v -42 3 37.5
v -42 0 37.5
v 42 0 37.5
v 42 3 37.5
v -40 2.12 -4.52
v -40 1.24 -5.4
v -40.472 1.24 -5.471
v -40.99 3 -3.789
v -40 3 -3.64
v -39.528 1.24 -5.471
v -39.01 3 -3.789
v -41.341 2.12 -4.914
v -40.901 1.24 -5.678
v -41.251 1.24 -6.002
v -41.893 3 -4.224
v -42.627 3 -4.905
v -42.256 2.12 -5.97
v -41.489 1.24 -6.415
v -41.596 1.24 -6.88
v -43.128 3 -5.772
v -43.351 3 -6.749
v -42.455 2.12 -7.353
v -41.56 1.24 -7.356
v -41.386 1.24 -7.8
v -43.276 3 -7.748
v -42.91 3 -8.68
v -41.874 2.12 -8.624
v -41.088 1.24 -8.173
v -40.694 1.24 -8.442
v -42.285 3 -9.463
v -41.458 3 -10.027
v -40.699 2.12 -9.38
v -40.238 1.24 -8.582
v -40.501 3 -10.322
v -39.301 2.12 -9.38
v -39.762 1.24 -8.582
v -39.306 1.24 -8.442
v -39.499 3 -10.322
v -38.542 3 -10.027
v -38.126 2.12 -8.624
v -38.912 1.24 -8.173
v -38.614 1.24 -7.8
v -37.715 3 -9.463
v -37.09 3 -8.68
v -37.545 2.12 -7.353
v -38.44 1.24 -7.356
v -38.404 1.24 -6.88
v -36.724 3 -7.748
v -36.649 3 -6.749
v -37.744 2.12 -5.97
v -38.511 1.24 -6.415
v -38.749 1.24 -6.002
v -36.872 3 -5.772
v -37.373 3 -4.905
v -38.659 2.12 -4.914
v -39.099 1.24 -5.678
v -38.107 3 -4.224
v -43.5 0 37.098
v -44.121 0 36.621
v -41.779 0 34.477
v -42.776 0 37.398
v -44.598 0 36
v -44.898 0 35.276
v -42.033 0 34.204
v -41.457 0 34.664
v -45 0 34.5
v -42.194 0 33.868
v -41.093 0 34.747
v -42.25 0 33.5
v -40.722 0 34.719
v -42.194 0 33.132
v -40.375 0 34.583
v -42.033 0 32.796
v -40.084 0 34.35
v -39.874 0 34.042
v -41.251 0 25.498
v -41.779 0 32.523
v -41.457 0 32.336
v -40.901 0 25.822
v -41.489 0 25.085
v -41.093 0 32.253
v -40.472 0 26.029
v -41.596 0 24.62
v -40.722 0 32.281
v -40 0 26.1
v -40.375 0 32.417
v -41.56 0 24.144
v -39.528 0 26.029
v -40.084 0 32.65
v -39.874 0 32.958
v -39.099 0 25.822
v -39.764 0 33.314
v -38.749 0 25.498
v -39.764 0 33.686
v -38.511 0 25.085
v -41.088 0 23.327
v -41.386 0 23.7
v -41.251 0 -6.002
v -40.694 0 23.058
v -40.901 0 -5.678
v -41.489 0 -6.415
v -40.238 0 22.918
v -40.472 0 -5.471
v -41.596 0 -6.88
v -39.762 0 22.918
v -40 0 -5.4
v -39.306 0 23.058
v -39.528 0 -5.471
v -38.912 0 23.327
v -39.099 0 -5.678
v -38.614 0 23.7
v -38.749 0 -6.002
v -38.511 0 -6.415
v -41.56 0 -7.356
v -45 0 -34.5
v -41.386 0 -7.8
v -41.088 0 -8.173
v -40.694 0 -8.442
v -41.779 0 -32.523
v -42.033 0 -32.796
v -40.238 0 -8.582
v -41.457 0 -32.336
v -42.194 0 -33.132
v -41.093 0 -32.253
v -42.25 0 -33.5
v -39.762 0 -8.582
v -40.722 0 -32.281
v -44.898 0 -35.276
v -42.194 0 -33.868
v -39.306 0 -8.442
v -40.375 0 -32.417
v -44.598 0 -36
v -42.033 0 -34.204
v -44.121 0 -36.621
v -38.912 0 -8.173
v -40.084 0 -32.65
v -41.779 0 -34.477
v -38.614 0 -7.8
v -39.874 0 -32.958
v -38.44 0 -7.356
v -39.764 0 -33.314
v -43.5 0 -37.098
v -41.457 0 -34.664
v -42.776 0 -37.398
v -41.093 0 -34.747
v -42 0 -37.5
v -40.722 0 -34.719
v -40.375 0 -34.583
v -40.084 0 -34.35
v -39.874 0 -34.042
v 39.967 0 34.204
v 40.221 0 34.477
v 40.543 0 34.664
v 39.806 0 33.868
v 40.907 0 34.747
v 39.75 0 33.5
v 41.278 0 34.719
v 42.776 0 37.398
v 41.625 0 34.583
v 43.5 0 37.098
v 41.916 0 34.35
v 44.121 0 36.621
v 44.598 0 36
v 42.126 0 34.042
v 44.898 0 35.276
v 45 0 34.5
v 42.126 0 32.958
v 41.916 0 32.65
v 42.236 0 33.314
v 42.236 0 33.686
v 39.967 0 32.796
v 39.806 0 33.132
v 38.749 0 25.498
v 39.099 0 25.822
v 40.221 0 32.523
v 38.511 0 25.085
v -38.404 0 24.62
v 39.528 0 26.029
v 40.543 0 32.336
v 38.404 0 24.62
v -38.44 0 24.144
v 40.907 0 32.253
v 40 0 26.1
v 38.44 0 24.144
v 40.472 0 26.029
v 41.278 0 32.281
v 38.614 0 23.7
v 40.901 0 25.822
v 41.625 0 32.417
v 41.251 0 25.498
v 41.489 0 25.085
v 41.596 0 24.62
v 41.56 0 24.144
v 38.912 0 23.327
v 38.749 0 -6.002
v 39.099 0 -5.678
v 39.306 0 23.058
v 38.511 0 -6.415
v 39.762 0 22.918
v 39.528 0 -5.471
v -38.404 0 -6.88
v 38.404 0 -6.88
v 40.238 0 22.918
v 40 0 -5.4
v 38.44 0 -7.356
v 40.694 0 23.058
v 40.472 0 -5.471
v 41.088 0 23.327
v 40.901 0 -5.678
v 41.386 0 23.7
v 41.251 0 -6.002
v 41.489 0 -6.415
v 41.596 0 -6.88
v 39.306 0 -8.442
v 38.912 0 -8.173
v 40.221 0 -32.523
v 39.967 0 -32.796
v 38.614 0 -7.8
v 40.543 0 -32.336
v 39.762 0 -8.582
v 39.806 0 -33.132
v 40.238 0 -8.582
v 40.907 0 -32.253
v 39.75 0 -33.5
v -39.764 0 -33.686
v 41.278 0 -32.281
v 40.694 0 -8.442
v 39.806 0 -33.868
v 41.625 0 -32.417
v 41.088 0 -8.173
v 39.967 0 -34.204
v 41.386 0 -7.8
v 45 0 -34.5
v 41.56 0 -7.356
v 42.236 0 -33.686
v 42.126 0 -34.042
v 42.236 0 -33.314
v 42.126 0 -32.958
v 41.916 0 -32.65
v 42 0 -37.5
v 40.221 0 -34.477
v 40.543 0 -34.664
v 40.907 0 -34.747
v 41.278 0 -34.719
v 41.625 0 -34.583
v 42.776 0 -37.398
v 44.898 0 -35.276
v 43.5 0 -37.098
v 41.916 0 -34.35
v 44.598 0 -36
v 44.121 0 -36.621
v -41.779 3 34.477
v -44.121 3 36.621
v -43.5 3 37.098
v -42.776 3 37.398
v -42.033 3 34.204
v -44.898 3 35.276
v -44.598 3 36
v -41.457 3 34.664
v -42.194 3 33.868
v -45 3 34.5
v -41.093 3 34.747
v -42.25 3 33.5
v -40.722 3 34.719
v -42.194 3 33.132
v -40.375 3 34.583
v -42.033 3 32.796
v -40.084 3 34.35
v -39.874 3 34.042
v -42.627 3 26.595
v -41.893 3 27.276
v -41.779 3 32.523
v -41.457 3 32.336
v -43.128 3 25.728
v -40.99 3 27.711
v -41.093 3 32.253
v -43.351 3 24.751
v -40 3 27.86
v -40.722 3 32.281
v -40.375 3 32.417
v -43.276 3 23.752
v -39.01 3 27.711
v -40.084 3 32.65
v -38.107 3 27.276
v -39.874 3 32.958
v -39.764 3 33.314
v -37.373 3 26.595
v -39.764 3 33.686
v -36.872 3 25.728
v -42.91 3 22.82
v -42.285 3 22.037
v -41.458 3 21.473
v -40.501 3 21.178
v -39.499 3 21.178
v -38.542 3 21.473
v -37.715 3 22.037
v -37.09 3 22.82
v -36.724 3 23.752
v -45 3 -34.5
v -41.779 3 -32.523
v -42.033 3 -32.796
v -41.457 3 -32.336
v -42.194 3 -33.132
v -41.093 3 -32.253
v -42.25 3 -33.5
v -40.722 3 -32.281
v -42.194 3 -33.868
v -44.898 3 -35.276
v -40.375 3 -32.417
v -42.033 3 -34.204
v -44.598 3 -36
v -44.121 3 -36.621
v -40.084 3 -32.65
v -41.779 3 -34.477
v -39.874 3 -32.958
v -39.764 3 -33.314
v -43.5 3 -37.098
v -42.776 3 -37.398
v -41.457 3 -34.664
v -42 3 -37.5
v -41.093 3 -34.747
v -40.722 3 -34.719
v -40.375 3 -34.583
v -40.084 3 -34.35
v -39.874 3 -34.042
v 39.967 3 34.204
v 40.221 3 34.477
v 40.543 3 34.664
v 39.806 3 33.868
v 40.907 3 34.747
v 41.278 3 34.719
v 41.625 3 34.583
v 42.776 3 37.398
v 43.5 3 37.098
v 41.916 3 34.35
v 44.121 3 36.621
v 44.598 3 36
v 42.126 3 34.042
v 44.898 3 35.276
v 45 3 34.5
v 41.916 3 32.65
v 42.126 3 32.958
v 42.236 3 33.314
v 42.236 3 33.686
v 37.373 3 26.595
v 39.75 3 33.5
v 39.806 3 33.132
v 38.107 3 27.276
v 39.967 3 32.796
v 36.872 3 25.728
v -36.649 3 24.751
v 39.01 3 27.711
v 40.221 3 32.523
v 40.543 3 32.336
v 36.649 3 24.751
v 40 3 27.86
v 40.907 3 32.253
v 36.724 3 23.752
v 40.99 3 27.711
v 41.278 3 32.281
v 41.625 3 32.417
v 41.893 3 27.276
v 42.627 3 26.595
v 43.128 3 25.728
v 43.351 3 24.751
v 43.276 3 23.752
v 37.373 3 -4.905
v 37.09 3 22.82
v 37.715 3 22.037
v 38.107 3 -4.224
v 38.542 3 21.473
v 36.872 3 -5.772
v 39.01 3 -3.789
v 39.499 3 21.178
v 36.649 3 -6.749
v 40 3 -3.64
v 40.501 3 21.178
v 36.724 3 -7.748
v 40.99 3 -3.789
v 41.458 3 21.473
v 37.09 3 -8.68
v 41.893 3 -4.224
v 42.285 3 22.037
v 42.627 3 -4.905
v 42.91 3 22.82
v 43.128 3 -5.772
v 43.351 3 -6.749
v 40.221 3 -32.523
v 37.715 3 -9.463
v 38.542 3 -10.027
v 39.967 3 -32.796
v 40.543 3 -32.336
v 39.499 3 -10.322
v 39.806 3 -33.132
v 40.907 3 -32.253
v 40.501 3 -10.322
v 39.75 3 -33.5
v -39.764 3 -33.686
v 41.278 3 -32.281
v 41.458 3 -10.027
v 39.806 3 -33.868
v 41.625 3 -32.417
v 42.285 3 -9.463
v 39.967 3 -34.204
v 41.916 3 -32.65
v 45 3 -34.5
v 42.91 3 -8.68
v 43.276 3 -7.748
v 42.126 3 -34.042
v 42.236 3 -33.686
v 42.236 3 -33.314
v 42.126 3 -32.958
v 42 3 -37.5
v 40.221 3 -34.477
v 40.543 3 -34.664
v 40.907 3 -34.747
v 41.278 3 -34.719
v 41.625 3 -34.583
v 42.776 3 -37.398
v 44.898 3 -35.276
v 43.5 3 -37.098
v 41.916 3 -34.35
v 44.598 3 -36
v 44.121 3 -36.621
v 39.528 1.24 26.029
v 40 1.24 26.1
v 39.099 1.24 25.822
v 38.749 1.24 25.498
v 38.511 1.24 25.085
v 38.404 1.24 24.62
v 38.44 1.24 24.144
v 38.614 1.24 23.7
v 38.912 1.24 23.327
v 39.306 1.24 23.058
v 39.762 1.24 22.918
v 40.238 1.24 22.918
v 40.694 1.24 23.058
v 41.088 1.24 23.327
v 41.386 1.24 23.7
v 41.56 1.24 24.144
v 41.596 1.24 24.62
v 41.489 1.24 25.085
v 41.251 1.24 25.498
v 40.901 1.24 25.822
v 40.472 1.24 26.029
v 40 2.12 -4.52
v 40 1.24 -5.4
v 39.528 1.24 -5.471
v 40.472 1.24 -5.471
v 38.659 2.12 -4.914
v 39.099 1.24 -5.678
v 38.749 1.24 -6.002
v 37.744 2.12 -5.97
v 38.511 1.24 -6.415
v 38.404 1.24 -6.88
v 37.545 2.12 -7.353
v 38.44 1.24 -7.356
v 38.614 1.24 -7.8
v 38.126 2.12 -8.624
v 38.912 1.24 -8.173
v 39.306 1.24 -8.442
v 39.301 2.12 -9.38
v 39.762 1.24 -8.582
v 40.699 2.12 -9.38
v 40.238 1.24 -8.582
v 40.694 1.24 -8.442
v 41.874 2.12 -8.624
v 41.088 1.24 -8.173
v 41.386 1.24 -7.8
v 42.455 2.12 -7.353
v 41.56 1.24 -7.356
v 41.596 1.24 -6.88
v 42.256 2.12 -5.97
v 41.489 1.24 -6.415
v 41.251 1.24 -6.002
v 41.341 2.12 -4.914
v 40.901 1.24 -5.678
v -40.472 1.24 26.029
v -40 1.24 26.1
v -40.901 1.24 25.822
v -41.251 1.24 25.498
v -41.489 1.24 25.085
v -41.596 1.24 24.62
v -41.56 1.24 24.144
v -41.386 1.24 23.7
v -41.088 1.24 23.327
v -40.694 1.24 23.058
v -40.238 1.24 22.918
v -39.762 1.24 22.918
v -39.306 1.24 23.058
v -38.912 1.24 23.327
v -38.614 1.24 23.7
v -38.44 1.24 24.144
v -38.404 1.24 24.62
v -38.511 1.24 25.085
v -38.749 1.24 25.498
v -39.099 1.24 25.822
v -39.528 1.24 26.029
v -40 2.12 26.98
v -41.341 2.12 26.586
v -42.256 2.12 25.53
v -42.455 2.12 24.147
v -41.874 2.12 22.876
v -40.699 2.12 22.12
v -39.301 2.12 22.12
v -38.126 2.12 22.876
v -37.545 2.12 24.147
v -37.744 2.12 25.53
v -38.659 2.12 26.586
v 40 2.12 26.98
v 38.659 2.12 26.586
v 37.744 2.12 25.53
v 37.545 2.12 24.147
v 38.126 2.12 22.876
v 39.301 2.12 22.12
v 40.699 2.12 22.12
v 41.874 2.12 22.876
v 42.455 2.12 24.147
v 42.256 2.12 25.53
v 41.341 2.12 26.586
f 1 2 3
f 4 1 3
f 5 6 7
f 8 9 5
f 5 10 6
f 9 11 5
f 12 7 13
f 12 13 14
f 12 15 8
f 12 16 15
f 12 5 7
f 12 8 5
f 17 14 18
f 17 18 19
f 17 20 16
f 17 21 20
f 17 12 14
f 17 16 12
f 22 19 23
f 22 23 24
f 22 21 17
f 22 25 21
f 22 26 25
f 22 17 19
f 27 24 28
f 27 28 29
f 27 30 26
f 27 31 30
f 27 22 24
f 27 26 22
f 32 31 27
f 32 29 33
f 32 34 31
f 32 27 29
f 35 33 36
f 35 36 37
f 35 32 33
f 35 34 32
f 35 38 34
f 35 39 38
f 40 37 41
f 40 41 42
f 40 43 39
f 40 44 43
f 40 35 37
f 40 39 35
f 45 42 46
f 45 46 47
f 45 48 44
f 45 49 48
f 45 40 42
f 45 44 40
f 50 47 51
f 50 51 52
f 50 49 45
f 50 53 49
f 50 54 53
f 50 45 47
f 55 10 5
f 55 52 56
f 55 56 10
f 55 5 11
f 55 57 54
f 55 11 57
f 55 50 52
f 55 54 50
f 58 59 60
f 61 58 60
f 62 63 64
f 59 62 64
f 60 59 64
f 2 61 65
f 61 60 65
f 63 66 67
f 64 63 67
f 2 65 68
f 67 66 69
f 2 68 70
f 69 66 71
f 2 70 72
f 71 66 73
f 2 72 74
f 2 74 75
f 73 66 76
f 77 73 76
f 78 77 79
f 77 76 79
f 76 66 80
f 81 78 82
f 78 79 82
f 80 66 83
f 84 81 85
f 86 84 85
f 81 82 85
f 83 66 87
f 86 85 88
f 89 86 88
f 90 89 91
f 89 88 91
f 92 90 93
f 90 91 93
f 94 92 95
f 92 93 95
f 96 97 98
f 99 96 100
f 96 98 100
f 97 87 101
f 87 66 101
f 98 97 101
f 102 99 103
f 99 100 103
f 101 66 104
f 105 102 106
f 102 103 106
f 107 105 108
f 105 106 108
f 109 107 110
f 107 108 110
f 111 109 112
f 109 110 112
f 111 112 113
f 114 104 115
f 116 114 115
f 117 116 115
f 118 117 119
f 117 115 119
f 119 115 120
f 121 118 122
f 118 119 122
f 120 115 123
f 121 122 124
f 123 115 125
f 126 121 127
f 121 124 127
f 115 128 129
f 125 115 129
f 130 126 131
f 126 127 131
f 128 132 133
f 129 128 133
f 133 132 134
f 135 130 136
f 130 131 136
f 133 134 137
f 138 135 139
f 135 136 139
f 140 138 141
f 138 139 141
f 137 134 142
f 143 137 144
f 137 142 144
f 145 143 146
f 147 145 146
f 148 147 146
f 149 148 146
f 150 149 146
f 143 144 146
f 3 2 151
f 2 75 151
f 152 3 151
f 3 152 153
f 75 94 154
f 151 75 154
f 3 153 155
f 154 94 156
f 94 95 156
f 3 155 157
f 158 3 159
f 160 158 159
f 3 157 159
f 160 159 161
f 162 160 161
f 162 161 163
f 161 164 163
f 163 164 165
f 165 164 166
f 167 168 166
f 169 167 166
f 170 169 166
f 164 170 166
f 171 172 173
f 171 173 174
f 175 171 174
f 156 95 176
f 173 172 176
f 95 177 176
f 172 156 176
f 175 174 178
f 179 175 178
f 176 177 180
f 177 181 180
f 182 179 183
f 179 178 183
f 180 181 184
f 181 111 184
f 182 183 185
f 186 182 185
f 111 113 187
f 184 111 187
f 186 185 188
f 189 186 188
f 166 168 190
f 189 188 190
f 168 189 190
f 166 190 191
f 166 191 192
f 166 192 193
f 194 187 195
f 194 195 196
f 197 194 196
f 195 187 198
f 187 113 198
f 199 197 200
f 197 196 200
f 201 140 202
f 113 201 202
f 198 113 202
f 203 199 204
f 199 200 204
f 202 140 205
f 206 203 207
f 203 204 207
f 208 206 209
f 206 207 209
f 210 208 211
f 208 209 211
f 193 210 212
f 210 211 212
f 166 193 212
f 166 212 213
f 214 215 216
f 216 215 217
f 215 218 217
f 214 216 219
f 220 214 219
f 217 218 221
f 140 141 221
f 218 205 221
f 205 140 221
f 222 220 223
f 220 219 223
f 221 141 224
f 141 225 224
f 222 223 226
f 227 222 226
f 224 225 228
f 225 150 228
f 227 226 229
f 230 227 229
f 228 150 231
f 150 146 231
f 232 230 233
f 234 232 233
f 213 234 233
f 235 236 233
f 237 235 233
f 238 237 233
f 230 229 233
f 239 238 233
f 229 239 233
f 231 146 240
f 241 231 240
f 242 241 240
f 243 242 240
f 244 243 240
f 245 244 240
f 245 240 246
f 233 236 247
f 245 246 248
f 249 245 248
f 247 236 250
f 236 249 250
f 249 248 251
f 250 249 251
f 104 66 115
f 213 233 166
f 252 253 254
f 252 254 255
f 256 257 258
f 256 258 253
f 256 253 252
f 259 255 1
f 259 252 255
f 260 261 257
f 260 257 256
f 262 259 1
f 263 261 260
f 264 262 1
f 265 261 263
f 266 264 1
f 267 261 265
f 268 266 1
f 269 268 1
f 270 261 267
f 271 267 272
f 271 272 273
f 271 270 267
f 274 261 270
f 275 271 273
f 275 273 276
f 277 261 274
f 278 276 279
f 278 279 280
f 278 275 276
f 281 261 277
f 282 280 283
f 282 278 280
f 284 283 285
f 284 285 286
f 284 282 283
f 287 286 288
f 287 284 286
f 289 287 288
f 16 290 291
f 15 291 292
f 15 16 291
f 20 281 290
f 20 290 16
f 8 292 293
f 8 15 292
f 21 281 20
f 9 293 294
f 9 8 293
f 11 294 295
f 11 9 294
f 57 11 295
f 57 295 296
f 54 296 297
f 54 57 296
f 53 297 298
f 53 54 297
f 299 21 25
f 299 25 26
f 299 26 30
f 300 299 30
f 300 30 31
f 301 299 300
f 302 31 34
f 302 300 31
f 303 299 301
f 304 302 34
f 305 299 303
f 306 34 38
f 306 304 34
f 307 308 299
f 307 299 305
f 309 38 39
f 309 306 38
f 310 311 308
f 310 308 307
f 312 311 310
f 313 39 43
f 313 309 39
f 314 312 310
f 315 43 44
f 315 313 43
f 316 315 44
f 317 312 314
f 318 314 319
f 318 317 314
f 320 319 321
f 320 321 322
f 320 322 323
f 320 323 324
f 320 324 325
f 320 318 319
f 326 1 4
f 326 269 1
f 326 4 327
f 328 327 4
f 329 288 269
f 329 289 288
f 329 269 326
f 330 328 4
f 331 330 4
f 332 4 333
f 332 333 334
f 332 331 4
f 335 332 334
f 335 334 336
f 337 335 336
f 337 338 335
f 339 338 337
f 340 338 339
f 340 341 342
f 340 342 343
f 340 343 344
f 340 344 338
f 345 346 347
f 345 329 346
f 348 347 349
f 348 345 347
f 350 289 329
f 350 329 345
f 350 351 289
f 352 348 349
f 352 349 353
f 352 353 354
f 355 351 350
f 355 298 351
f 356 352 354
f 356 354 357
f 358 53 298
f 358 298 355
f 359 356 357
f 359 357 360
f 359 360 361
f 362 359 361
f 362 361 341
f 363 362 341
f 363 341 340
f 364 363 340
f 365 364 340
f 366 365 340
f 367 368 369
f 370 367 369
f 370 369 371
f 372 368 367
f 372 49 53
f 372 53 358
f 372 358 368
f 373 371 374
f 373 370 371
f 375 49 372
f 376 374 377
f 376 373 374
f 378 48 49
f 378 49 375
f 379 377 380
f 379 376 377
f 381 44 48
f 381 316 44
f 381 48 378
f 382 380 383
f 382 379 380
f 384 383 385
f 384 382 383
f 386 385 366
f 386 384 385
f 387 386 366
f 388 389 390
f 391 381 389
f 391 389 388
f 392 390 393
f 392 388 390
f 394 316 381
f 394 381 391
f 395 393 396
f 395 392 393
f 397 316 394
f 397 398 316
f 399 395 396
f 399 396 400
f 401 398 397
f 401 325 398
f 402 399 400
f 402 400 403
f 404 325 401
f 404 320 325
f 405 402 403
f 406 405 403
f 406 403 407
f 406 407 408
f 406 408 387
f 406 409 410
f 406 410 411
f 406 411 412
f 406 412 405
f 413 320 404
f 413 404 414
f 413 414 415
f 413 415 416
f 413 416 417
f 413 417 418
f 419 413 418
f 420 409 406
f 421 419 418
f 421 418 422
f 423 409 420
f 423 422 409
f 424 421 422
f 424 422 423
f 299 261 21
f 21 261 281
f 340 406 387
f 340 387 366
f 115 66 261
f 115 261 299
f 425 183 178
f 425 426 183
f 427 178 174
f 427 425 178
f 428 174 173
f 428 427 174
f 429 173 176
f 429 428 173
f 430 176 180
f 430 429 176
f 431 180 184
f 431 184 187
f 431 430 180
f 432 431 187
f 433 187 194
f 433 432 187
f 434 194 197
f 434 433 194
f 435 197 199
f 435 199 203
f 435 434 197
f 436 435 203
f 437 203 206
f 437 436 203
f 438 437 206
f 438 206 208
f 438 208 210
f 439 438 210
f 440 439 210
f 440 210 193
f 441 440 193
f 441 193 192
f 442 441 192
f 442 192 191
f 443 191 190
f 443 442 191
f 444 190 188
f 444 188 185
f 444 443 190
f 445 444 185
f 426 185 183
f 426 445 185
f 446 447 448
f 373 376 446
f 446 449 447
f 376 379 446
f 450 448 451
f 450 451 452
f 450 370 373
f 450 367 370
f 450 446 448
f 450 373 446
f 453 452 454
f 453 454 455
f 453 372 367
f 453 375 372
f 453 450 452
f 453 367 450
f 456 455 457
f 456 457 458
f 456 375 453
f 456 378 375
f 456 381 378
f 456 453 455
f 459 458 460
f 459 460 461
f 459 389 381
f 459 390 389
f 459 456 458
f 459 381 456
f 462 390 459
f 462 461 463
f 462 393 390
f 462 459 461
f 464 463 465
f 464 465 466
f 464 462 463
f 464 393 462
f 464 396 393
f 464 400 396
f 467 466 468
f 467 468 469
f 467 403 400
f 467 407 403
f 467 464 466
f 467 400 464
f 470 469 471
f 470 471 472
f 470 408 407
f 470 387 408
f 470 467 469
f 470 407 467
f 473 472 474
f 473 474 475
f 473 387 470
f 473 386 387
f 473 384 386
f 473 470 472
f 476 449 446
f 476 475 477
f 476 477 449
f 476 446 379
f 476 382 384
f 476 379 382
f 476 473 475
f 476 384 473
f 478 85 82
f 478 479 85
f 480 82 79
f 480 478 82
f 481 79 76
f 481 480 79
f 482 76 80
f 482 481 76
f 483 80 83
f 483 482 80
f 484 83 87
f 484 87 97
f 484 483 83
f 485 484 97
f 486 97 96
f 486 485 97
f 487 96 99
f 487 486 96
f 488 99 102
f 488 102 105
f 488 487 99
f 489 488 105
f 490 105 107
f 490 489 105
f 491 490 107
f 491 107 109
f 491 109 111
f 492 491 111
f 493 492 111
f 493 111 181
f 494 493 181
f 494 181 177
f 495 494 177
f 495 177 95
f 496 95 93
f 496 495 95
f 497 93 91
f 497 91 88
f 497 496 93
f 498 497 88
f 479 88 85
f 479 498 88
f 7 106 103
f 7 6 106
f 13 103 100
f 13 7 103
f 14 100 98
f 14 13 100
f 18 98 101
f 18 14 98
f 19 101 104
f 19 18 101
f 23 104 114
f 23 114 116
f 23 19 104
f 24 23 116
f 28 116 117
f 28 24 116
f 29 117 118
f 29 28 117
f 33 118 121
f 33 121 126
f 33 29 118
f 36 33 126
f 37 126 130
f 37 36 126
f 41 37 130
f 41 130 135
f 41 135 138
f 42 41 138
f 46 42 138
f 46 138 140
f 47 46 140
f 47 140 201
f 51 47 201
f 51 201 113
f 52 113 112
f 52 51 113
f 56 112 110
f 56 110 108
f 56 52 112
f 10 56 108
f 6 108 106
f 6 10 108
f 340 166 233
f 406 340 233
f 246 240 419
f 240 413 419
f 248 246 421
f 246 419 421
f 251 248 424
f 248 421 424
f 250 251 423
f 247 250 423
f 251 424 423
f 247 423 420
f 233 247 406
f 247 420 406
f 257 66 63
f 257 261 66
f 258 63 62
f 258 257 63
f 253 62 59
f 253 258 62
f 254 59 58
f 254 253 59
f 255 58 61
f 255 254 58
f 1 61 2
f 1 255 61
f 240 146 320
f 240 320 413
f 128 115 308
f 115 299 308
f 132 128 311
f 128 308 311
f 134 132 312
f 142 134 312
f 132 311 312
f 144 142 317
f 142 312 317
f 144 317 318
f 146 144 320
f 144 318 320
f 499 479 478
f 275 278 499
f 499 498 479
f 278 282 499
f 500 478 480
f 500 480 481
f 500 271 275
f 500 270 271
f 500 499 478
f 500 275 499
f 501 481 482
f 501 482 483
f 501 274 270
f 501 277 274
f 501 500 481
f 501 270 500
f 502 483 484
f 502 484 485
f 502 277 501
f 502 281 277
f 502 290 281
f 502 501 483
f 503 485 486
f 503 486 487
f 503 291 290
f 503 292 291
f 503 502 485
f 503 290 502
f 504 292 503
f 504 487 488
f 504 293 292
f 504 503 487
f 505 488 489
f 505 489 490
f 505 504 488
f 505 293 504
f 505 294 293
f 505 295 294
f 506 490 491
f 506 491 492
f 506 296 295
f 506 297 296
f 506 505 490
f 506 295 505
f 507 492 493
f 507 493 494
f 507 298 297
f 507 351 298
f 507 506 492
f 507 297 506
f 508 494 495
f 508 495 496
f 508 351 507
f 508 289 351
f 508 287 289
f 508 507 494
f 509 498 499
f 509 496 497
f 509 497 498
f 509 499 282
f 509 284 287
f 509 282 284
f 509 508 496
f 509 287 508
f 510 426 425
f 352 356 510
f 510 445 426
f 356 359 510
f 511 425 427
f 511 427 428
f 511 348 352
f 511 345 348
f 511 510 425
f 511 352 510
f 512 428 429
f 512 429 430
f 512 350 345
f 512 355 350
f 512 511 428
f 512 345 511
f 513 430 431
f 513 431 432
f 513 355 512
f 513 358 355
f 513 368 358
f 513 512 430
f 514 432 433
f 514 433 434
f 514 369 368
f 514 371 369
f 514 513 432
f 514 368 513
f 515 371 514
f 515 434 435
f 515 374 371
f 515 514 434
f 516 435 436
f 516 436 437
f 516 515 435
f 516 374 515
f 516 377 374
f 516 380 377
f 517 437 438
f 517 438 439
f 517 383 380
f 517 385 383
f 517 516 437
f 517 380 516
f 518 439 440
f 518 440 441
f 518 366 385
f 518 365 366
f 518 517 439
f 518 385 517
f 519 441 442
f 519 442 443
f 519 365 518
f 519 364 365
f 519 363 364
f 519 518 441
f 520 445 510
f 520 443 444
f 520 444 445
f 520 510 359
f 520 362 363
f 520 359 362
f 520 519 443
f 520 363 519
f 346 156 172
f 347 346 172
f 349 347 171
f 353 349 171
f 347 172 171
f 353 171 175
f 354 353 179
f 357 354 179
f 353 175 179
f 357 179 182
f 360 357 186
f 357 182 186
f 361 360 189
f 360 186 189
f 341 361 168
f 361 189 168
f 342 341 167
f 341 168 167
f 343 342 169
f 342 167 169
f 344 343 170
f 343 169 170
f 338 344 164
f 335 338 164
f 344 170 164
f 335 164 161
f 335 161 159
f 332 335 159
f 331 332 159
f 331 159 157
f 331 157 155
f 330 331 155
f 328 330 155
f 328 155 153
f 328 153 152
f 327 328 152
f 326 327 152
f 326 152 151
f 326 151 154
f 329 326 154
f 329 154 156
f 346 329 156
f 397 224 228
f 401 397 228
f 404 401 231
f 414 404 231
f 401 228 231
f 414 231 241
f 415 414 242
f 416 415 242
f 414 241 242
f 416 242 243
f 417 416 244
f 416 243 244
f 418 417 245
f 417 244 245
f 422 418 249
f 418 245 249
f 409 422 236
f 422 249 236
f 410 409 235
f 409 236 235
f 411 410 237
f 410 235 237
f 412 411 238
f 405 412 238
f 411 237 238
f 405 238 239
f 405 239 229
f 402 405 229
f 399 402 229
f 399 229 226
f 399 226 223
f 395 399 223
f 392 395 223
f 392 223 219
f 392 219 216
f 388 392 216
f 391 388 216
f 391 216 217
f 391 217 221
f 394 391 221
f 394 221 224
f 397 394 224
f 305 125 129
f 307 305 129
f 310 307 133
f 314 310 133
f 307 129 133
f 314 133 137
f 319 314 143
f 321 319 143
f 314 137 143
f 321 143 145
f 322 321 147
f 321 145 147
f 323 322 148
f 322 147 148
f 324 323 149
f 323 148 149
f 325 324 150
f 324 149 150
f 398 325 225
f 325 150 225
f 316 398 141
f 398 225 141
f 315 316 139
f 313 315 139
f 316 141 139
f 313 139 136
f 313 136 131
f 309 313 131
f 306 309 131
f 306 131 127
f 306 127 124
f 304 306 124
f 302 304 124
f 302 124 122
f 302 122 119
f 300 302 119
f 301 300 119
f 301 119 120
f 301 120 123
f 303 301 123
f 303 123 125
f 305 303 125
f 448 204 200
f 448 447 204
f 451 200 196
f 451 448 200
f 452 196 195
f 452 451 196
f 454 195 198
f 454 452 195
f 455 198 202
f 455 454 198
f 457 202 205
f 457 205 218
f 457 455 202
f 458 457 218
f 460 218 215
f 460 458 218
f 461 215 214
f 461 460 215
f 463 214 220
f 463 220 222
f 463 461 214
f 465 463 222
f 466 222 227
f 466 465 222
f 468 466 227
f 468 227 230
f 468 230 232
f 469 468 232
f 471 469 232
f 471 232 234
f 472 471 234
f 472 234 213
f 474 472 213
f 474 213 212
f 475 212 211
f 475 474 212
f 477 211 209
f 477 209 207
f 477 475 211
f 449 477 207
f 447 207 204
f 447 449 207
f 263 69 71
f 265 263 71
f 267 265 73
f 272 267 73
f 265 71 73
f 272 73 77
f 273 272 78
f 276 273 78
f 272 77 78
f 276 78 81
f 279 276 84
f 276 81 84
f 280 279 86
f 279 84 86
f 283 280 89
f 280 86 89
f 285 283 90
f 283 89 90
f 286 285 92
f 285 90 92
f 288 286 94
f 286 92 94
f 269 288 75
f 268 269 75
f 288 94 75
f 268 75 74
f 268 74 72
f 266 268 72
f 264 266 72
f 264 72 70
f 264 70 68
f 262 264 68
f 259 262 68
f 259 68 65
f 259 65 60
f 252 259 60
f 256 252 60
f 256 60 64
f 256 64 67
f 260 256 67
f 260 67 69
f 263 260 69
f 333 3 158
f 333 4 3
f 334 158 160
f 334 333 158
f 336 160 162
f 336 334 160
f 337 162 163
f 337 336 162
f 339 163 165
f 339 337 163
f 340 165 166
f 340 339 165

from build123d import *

# Parameters (mm, degrees)
SKETCH1_W                    = 90
SKETCH1_H                    = 75
BOSS_EXTRUDE1_DEPTH          = 3
TAP_DRILL_FOR_M3X0_5_TAP1_D  = 2.5
FILLET1_R                    = 3
CSK_FOR_M3_SFHCS1_AT_2_COUNT = 2
CSK_FOR_M3_SFHCS1_AT_2_PITCH = 31.5
CSK_FOR_M3_SFHCS1_AT_3_COUNT = 2
CSK_FOR_M3_SFHCS1_AT_3_PITCH = 85.97819491
CSK_FOR_M3_SFHCS1_AT_4_COUNT = 2
CSK_FOR_M3_SFHCS1_AT_4_PITCH = 80


with BuildPart() as part:
    # Sketch1 → Boss-Extrude1 (new body)
    with BuildSketch(Plane(origin=(0, 0, 0), x_dir=(1, 0, 0), z_dir=(0, 1, 0))):
        Rectangle(SKETCH1_W, SKETCH1_H)
    extrude(amount=BOSS_EXTRUDE1_DEPTH)

    # Tap Drill for M3x0.5 Tap1 (through all)
    with Locations(Plane(origin=(0, 3, 0), x_dir=(1, 0, 0), z_dir=(0, 1, 0))):
        with Locations((-41, 33.5), (-41, -33.5), (41, -33.5), (41, 33.5)):
            Hole(TAP_DRILL_FOR_M3X0_5_TAP1_D / 2)

    # Fillet1
    fillet1_edges = [part.edges().sort_by_distance(p)[0] for p in [
        (-45, 1.5, -37.5),
        (45, 1.5, -37.5),
        (45, 1.5, 37.5),
        (-45, 1.5, 37.5),
    ]]
    fillet(fillet1_edges, radius=FILLET1_R)

    # Sketch7 → CSK for M3 SFHCS1 (revolve, cut)
    with BuildSketch(Plane(origin=(-40, 3, -7), x_dir=(0, 0, 1), z_dir=(1, 0, 0))):
        Polygon((0, 0), (0, 3), (1.6, 3), (1.6, 1.76), (3.36, 0), align=None)
    csk_for_m3_sfhcs1 = revolve(axis=Axis((-40, 9.35, -7), (0, -1, 0)), mode=Mode.SUBTRACT)

    # CSK for M3 SFHCS1 at 2: CSK for M3 SFHCS1 ×2
    with Locations(*[(0, 0, i * CSK_FOR_M3_SFHCS1_AT_2_PITCH) for i in range(1, CSK_FOR_M3_SFHCS1_AT_2_COUNT)]):
        add(csk_for_m3_sfhcs1, mode=Mode.SUBTRACT)

    # CSK for M3 SFHCS1 at 3: CSK for M3 SFHCS1 ×2
    with Locations(*[Vector(0.9304684761484525, 0, 0.36637196248345316) * (i * CSK_FOR_M3_SFHCS1_AT_3_PITCH) for i in range(1, CSK_FOR_M3_SFHCS1_AT_3_COUNT)]):
        add(csk_for_m3_sfhcs1, mode=Mode.SUBTRACT)

    # CSK for M3 SFHCS1 at 4: CSK for M3 SFHCS1 ×2
    with Locations(*[(i * CSK_FOR_M3_SFHCS1_AT_4_PITCH, 0, 0) for i in range(1, CSK_FOR_M3_SFHCS1_AT_4_COUNT)]):
        add(csk_for_m3_sfhcs1, mode=Mode.SUBTRACT)


solid = part.part
